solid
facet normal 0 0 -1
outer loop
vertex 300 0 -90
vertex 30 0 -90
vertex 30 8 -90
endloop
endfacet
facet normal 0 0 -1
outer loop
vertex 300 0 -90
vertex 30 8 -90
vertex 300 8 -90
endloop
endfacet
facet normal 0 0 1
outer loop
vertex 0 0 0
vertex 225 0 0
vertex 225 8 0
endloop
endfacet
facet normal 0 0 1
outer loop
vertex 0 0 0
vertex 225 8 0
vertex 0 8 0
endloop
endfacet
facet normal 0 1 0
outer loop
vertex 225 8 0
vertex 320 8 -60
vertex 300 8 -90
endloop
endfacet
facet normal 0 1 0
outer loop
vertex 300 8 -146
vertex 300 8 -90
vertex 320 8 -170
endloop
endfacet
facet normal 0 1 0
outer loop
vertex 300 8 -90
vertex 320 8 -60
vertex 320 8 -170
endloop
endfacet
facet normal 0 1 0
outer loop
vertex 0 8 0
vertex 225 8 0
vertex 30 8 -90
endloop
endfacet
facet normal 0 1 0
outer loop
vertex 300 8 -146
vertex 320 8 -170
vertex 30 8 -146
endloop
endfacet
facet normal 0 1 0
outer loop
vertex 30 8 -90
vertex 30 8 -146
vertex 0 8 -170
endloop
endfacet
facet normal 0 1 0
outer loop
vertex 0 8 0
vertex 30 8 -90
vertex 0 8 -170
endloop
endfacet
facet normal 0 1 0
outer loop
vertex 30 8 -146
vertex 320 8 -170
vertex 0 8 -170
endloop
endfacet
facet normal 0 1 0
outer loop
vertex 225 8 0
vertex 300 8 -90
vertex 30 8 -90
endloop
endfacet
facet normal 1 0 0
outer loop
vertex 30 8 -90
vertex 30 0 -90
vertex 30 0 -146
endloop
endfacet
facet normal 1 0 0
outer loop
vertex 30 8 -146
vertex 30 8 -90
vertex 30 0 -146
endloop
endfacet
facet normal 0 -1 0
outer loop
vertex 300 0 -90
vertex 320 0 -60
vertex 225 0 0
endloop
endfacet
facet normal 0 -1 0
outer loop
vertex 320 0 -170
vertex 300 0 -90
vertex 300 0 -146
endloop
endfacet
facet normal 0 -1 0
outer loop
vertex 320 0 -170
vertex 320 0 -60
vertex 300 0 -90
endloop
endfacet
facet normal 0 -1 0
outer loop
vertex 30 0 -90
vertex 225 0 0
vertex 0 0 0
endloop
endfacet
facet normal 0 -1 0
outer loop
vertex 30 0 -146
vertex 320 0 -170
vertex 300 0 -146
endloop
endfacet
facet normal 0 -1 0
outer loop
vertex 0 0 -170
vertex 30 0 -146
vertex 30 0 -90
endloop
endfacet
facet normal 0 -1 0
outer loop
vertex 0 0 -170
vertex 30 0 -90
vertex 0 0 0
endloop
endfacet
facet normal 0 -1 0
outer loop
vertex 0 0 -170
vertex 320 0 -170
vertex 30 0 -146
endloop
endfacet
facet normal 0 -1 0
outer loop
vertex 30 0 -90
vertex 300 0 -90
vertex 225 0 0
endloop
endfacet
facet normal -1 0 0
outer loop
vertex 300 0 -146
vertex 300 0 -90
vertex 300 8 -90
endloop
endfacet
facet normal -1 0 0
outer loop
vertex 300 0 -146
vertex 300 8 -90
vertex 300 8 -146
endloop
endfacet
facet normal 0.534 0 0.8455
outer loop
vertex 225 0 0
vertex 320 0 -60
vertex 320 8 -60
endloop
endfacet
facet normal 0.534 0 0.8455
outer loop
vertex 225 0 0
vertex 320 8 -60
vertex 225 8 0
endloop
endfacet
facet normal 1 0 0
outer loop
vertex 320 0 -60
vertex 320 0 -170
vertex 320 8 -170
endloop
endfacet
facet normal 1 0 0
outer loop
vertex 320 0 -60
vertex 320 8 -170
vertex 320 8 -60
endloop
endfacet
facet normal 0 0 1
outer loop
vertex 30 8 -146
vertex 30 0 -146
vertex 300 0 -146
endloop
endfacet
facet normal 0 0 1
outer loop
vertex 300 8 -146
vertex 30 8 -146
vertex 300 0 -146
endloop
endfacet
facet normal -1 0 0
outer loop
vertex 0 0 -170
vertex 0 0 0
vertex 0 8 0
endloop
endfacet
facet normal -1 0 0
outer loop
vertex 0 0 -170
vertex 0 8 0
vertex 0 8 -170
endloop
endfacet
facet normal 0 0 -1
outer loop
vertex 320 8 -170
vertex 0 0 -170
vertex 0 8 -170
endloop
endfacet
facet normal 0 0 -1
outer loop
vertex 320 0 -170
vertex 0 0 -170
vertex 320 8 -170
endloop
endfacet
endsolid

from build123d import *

# Parameters (mm, degrees)
SKETCH_1_W      = 270
SKETCH_1_H      = 56
EXTRUDE_1_DEPTH = 8


with BuildPart() as part:
    # Эскиз1 → Бобышка-Вытянуть1 (new body)
    with BuildSketch(Plane(origin=(0, 0, 0), x_dir=(1, 0, 0), z_dir=(0, 1, 0))):
        Polygon((320, 170), (320, 60), (225, 0), (0, 0), (0, 170), align=None)
        with Locations((165, 118)):
            Rectangle(SKETCH_1_W, SKETCH_1_H, mode=Mode.SUBTRACT)
    extrude(amount=EXTRUDE_1_DEPTH)


solid = part.part
